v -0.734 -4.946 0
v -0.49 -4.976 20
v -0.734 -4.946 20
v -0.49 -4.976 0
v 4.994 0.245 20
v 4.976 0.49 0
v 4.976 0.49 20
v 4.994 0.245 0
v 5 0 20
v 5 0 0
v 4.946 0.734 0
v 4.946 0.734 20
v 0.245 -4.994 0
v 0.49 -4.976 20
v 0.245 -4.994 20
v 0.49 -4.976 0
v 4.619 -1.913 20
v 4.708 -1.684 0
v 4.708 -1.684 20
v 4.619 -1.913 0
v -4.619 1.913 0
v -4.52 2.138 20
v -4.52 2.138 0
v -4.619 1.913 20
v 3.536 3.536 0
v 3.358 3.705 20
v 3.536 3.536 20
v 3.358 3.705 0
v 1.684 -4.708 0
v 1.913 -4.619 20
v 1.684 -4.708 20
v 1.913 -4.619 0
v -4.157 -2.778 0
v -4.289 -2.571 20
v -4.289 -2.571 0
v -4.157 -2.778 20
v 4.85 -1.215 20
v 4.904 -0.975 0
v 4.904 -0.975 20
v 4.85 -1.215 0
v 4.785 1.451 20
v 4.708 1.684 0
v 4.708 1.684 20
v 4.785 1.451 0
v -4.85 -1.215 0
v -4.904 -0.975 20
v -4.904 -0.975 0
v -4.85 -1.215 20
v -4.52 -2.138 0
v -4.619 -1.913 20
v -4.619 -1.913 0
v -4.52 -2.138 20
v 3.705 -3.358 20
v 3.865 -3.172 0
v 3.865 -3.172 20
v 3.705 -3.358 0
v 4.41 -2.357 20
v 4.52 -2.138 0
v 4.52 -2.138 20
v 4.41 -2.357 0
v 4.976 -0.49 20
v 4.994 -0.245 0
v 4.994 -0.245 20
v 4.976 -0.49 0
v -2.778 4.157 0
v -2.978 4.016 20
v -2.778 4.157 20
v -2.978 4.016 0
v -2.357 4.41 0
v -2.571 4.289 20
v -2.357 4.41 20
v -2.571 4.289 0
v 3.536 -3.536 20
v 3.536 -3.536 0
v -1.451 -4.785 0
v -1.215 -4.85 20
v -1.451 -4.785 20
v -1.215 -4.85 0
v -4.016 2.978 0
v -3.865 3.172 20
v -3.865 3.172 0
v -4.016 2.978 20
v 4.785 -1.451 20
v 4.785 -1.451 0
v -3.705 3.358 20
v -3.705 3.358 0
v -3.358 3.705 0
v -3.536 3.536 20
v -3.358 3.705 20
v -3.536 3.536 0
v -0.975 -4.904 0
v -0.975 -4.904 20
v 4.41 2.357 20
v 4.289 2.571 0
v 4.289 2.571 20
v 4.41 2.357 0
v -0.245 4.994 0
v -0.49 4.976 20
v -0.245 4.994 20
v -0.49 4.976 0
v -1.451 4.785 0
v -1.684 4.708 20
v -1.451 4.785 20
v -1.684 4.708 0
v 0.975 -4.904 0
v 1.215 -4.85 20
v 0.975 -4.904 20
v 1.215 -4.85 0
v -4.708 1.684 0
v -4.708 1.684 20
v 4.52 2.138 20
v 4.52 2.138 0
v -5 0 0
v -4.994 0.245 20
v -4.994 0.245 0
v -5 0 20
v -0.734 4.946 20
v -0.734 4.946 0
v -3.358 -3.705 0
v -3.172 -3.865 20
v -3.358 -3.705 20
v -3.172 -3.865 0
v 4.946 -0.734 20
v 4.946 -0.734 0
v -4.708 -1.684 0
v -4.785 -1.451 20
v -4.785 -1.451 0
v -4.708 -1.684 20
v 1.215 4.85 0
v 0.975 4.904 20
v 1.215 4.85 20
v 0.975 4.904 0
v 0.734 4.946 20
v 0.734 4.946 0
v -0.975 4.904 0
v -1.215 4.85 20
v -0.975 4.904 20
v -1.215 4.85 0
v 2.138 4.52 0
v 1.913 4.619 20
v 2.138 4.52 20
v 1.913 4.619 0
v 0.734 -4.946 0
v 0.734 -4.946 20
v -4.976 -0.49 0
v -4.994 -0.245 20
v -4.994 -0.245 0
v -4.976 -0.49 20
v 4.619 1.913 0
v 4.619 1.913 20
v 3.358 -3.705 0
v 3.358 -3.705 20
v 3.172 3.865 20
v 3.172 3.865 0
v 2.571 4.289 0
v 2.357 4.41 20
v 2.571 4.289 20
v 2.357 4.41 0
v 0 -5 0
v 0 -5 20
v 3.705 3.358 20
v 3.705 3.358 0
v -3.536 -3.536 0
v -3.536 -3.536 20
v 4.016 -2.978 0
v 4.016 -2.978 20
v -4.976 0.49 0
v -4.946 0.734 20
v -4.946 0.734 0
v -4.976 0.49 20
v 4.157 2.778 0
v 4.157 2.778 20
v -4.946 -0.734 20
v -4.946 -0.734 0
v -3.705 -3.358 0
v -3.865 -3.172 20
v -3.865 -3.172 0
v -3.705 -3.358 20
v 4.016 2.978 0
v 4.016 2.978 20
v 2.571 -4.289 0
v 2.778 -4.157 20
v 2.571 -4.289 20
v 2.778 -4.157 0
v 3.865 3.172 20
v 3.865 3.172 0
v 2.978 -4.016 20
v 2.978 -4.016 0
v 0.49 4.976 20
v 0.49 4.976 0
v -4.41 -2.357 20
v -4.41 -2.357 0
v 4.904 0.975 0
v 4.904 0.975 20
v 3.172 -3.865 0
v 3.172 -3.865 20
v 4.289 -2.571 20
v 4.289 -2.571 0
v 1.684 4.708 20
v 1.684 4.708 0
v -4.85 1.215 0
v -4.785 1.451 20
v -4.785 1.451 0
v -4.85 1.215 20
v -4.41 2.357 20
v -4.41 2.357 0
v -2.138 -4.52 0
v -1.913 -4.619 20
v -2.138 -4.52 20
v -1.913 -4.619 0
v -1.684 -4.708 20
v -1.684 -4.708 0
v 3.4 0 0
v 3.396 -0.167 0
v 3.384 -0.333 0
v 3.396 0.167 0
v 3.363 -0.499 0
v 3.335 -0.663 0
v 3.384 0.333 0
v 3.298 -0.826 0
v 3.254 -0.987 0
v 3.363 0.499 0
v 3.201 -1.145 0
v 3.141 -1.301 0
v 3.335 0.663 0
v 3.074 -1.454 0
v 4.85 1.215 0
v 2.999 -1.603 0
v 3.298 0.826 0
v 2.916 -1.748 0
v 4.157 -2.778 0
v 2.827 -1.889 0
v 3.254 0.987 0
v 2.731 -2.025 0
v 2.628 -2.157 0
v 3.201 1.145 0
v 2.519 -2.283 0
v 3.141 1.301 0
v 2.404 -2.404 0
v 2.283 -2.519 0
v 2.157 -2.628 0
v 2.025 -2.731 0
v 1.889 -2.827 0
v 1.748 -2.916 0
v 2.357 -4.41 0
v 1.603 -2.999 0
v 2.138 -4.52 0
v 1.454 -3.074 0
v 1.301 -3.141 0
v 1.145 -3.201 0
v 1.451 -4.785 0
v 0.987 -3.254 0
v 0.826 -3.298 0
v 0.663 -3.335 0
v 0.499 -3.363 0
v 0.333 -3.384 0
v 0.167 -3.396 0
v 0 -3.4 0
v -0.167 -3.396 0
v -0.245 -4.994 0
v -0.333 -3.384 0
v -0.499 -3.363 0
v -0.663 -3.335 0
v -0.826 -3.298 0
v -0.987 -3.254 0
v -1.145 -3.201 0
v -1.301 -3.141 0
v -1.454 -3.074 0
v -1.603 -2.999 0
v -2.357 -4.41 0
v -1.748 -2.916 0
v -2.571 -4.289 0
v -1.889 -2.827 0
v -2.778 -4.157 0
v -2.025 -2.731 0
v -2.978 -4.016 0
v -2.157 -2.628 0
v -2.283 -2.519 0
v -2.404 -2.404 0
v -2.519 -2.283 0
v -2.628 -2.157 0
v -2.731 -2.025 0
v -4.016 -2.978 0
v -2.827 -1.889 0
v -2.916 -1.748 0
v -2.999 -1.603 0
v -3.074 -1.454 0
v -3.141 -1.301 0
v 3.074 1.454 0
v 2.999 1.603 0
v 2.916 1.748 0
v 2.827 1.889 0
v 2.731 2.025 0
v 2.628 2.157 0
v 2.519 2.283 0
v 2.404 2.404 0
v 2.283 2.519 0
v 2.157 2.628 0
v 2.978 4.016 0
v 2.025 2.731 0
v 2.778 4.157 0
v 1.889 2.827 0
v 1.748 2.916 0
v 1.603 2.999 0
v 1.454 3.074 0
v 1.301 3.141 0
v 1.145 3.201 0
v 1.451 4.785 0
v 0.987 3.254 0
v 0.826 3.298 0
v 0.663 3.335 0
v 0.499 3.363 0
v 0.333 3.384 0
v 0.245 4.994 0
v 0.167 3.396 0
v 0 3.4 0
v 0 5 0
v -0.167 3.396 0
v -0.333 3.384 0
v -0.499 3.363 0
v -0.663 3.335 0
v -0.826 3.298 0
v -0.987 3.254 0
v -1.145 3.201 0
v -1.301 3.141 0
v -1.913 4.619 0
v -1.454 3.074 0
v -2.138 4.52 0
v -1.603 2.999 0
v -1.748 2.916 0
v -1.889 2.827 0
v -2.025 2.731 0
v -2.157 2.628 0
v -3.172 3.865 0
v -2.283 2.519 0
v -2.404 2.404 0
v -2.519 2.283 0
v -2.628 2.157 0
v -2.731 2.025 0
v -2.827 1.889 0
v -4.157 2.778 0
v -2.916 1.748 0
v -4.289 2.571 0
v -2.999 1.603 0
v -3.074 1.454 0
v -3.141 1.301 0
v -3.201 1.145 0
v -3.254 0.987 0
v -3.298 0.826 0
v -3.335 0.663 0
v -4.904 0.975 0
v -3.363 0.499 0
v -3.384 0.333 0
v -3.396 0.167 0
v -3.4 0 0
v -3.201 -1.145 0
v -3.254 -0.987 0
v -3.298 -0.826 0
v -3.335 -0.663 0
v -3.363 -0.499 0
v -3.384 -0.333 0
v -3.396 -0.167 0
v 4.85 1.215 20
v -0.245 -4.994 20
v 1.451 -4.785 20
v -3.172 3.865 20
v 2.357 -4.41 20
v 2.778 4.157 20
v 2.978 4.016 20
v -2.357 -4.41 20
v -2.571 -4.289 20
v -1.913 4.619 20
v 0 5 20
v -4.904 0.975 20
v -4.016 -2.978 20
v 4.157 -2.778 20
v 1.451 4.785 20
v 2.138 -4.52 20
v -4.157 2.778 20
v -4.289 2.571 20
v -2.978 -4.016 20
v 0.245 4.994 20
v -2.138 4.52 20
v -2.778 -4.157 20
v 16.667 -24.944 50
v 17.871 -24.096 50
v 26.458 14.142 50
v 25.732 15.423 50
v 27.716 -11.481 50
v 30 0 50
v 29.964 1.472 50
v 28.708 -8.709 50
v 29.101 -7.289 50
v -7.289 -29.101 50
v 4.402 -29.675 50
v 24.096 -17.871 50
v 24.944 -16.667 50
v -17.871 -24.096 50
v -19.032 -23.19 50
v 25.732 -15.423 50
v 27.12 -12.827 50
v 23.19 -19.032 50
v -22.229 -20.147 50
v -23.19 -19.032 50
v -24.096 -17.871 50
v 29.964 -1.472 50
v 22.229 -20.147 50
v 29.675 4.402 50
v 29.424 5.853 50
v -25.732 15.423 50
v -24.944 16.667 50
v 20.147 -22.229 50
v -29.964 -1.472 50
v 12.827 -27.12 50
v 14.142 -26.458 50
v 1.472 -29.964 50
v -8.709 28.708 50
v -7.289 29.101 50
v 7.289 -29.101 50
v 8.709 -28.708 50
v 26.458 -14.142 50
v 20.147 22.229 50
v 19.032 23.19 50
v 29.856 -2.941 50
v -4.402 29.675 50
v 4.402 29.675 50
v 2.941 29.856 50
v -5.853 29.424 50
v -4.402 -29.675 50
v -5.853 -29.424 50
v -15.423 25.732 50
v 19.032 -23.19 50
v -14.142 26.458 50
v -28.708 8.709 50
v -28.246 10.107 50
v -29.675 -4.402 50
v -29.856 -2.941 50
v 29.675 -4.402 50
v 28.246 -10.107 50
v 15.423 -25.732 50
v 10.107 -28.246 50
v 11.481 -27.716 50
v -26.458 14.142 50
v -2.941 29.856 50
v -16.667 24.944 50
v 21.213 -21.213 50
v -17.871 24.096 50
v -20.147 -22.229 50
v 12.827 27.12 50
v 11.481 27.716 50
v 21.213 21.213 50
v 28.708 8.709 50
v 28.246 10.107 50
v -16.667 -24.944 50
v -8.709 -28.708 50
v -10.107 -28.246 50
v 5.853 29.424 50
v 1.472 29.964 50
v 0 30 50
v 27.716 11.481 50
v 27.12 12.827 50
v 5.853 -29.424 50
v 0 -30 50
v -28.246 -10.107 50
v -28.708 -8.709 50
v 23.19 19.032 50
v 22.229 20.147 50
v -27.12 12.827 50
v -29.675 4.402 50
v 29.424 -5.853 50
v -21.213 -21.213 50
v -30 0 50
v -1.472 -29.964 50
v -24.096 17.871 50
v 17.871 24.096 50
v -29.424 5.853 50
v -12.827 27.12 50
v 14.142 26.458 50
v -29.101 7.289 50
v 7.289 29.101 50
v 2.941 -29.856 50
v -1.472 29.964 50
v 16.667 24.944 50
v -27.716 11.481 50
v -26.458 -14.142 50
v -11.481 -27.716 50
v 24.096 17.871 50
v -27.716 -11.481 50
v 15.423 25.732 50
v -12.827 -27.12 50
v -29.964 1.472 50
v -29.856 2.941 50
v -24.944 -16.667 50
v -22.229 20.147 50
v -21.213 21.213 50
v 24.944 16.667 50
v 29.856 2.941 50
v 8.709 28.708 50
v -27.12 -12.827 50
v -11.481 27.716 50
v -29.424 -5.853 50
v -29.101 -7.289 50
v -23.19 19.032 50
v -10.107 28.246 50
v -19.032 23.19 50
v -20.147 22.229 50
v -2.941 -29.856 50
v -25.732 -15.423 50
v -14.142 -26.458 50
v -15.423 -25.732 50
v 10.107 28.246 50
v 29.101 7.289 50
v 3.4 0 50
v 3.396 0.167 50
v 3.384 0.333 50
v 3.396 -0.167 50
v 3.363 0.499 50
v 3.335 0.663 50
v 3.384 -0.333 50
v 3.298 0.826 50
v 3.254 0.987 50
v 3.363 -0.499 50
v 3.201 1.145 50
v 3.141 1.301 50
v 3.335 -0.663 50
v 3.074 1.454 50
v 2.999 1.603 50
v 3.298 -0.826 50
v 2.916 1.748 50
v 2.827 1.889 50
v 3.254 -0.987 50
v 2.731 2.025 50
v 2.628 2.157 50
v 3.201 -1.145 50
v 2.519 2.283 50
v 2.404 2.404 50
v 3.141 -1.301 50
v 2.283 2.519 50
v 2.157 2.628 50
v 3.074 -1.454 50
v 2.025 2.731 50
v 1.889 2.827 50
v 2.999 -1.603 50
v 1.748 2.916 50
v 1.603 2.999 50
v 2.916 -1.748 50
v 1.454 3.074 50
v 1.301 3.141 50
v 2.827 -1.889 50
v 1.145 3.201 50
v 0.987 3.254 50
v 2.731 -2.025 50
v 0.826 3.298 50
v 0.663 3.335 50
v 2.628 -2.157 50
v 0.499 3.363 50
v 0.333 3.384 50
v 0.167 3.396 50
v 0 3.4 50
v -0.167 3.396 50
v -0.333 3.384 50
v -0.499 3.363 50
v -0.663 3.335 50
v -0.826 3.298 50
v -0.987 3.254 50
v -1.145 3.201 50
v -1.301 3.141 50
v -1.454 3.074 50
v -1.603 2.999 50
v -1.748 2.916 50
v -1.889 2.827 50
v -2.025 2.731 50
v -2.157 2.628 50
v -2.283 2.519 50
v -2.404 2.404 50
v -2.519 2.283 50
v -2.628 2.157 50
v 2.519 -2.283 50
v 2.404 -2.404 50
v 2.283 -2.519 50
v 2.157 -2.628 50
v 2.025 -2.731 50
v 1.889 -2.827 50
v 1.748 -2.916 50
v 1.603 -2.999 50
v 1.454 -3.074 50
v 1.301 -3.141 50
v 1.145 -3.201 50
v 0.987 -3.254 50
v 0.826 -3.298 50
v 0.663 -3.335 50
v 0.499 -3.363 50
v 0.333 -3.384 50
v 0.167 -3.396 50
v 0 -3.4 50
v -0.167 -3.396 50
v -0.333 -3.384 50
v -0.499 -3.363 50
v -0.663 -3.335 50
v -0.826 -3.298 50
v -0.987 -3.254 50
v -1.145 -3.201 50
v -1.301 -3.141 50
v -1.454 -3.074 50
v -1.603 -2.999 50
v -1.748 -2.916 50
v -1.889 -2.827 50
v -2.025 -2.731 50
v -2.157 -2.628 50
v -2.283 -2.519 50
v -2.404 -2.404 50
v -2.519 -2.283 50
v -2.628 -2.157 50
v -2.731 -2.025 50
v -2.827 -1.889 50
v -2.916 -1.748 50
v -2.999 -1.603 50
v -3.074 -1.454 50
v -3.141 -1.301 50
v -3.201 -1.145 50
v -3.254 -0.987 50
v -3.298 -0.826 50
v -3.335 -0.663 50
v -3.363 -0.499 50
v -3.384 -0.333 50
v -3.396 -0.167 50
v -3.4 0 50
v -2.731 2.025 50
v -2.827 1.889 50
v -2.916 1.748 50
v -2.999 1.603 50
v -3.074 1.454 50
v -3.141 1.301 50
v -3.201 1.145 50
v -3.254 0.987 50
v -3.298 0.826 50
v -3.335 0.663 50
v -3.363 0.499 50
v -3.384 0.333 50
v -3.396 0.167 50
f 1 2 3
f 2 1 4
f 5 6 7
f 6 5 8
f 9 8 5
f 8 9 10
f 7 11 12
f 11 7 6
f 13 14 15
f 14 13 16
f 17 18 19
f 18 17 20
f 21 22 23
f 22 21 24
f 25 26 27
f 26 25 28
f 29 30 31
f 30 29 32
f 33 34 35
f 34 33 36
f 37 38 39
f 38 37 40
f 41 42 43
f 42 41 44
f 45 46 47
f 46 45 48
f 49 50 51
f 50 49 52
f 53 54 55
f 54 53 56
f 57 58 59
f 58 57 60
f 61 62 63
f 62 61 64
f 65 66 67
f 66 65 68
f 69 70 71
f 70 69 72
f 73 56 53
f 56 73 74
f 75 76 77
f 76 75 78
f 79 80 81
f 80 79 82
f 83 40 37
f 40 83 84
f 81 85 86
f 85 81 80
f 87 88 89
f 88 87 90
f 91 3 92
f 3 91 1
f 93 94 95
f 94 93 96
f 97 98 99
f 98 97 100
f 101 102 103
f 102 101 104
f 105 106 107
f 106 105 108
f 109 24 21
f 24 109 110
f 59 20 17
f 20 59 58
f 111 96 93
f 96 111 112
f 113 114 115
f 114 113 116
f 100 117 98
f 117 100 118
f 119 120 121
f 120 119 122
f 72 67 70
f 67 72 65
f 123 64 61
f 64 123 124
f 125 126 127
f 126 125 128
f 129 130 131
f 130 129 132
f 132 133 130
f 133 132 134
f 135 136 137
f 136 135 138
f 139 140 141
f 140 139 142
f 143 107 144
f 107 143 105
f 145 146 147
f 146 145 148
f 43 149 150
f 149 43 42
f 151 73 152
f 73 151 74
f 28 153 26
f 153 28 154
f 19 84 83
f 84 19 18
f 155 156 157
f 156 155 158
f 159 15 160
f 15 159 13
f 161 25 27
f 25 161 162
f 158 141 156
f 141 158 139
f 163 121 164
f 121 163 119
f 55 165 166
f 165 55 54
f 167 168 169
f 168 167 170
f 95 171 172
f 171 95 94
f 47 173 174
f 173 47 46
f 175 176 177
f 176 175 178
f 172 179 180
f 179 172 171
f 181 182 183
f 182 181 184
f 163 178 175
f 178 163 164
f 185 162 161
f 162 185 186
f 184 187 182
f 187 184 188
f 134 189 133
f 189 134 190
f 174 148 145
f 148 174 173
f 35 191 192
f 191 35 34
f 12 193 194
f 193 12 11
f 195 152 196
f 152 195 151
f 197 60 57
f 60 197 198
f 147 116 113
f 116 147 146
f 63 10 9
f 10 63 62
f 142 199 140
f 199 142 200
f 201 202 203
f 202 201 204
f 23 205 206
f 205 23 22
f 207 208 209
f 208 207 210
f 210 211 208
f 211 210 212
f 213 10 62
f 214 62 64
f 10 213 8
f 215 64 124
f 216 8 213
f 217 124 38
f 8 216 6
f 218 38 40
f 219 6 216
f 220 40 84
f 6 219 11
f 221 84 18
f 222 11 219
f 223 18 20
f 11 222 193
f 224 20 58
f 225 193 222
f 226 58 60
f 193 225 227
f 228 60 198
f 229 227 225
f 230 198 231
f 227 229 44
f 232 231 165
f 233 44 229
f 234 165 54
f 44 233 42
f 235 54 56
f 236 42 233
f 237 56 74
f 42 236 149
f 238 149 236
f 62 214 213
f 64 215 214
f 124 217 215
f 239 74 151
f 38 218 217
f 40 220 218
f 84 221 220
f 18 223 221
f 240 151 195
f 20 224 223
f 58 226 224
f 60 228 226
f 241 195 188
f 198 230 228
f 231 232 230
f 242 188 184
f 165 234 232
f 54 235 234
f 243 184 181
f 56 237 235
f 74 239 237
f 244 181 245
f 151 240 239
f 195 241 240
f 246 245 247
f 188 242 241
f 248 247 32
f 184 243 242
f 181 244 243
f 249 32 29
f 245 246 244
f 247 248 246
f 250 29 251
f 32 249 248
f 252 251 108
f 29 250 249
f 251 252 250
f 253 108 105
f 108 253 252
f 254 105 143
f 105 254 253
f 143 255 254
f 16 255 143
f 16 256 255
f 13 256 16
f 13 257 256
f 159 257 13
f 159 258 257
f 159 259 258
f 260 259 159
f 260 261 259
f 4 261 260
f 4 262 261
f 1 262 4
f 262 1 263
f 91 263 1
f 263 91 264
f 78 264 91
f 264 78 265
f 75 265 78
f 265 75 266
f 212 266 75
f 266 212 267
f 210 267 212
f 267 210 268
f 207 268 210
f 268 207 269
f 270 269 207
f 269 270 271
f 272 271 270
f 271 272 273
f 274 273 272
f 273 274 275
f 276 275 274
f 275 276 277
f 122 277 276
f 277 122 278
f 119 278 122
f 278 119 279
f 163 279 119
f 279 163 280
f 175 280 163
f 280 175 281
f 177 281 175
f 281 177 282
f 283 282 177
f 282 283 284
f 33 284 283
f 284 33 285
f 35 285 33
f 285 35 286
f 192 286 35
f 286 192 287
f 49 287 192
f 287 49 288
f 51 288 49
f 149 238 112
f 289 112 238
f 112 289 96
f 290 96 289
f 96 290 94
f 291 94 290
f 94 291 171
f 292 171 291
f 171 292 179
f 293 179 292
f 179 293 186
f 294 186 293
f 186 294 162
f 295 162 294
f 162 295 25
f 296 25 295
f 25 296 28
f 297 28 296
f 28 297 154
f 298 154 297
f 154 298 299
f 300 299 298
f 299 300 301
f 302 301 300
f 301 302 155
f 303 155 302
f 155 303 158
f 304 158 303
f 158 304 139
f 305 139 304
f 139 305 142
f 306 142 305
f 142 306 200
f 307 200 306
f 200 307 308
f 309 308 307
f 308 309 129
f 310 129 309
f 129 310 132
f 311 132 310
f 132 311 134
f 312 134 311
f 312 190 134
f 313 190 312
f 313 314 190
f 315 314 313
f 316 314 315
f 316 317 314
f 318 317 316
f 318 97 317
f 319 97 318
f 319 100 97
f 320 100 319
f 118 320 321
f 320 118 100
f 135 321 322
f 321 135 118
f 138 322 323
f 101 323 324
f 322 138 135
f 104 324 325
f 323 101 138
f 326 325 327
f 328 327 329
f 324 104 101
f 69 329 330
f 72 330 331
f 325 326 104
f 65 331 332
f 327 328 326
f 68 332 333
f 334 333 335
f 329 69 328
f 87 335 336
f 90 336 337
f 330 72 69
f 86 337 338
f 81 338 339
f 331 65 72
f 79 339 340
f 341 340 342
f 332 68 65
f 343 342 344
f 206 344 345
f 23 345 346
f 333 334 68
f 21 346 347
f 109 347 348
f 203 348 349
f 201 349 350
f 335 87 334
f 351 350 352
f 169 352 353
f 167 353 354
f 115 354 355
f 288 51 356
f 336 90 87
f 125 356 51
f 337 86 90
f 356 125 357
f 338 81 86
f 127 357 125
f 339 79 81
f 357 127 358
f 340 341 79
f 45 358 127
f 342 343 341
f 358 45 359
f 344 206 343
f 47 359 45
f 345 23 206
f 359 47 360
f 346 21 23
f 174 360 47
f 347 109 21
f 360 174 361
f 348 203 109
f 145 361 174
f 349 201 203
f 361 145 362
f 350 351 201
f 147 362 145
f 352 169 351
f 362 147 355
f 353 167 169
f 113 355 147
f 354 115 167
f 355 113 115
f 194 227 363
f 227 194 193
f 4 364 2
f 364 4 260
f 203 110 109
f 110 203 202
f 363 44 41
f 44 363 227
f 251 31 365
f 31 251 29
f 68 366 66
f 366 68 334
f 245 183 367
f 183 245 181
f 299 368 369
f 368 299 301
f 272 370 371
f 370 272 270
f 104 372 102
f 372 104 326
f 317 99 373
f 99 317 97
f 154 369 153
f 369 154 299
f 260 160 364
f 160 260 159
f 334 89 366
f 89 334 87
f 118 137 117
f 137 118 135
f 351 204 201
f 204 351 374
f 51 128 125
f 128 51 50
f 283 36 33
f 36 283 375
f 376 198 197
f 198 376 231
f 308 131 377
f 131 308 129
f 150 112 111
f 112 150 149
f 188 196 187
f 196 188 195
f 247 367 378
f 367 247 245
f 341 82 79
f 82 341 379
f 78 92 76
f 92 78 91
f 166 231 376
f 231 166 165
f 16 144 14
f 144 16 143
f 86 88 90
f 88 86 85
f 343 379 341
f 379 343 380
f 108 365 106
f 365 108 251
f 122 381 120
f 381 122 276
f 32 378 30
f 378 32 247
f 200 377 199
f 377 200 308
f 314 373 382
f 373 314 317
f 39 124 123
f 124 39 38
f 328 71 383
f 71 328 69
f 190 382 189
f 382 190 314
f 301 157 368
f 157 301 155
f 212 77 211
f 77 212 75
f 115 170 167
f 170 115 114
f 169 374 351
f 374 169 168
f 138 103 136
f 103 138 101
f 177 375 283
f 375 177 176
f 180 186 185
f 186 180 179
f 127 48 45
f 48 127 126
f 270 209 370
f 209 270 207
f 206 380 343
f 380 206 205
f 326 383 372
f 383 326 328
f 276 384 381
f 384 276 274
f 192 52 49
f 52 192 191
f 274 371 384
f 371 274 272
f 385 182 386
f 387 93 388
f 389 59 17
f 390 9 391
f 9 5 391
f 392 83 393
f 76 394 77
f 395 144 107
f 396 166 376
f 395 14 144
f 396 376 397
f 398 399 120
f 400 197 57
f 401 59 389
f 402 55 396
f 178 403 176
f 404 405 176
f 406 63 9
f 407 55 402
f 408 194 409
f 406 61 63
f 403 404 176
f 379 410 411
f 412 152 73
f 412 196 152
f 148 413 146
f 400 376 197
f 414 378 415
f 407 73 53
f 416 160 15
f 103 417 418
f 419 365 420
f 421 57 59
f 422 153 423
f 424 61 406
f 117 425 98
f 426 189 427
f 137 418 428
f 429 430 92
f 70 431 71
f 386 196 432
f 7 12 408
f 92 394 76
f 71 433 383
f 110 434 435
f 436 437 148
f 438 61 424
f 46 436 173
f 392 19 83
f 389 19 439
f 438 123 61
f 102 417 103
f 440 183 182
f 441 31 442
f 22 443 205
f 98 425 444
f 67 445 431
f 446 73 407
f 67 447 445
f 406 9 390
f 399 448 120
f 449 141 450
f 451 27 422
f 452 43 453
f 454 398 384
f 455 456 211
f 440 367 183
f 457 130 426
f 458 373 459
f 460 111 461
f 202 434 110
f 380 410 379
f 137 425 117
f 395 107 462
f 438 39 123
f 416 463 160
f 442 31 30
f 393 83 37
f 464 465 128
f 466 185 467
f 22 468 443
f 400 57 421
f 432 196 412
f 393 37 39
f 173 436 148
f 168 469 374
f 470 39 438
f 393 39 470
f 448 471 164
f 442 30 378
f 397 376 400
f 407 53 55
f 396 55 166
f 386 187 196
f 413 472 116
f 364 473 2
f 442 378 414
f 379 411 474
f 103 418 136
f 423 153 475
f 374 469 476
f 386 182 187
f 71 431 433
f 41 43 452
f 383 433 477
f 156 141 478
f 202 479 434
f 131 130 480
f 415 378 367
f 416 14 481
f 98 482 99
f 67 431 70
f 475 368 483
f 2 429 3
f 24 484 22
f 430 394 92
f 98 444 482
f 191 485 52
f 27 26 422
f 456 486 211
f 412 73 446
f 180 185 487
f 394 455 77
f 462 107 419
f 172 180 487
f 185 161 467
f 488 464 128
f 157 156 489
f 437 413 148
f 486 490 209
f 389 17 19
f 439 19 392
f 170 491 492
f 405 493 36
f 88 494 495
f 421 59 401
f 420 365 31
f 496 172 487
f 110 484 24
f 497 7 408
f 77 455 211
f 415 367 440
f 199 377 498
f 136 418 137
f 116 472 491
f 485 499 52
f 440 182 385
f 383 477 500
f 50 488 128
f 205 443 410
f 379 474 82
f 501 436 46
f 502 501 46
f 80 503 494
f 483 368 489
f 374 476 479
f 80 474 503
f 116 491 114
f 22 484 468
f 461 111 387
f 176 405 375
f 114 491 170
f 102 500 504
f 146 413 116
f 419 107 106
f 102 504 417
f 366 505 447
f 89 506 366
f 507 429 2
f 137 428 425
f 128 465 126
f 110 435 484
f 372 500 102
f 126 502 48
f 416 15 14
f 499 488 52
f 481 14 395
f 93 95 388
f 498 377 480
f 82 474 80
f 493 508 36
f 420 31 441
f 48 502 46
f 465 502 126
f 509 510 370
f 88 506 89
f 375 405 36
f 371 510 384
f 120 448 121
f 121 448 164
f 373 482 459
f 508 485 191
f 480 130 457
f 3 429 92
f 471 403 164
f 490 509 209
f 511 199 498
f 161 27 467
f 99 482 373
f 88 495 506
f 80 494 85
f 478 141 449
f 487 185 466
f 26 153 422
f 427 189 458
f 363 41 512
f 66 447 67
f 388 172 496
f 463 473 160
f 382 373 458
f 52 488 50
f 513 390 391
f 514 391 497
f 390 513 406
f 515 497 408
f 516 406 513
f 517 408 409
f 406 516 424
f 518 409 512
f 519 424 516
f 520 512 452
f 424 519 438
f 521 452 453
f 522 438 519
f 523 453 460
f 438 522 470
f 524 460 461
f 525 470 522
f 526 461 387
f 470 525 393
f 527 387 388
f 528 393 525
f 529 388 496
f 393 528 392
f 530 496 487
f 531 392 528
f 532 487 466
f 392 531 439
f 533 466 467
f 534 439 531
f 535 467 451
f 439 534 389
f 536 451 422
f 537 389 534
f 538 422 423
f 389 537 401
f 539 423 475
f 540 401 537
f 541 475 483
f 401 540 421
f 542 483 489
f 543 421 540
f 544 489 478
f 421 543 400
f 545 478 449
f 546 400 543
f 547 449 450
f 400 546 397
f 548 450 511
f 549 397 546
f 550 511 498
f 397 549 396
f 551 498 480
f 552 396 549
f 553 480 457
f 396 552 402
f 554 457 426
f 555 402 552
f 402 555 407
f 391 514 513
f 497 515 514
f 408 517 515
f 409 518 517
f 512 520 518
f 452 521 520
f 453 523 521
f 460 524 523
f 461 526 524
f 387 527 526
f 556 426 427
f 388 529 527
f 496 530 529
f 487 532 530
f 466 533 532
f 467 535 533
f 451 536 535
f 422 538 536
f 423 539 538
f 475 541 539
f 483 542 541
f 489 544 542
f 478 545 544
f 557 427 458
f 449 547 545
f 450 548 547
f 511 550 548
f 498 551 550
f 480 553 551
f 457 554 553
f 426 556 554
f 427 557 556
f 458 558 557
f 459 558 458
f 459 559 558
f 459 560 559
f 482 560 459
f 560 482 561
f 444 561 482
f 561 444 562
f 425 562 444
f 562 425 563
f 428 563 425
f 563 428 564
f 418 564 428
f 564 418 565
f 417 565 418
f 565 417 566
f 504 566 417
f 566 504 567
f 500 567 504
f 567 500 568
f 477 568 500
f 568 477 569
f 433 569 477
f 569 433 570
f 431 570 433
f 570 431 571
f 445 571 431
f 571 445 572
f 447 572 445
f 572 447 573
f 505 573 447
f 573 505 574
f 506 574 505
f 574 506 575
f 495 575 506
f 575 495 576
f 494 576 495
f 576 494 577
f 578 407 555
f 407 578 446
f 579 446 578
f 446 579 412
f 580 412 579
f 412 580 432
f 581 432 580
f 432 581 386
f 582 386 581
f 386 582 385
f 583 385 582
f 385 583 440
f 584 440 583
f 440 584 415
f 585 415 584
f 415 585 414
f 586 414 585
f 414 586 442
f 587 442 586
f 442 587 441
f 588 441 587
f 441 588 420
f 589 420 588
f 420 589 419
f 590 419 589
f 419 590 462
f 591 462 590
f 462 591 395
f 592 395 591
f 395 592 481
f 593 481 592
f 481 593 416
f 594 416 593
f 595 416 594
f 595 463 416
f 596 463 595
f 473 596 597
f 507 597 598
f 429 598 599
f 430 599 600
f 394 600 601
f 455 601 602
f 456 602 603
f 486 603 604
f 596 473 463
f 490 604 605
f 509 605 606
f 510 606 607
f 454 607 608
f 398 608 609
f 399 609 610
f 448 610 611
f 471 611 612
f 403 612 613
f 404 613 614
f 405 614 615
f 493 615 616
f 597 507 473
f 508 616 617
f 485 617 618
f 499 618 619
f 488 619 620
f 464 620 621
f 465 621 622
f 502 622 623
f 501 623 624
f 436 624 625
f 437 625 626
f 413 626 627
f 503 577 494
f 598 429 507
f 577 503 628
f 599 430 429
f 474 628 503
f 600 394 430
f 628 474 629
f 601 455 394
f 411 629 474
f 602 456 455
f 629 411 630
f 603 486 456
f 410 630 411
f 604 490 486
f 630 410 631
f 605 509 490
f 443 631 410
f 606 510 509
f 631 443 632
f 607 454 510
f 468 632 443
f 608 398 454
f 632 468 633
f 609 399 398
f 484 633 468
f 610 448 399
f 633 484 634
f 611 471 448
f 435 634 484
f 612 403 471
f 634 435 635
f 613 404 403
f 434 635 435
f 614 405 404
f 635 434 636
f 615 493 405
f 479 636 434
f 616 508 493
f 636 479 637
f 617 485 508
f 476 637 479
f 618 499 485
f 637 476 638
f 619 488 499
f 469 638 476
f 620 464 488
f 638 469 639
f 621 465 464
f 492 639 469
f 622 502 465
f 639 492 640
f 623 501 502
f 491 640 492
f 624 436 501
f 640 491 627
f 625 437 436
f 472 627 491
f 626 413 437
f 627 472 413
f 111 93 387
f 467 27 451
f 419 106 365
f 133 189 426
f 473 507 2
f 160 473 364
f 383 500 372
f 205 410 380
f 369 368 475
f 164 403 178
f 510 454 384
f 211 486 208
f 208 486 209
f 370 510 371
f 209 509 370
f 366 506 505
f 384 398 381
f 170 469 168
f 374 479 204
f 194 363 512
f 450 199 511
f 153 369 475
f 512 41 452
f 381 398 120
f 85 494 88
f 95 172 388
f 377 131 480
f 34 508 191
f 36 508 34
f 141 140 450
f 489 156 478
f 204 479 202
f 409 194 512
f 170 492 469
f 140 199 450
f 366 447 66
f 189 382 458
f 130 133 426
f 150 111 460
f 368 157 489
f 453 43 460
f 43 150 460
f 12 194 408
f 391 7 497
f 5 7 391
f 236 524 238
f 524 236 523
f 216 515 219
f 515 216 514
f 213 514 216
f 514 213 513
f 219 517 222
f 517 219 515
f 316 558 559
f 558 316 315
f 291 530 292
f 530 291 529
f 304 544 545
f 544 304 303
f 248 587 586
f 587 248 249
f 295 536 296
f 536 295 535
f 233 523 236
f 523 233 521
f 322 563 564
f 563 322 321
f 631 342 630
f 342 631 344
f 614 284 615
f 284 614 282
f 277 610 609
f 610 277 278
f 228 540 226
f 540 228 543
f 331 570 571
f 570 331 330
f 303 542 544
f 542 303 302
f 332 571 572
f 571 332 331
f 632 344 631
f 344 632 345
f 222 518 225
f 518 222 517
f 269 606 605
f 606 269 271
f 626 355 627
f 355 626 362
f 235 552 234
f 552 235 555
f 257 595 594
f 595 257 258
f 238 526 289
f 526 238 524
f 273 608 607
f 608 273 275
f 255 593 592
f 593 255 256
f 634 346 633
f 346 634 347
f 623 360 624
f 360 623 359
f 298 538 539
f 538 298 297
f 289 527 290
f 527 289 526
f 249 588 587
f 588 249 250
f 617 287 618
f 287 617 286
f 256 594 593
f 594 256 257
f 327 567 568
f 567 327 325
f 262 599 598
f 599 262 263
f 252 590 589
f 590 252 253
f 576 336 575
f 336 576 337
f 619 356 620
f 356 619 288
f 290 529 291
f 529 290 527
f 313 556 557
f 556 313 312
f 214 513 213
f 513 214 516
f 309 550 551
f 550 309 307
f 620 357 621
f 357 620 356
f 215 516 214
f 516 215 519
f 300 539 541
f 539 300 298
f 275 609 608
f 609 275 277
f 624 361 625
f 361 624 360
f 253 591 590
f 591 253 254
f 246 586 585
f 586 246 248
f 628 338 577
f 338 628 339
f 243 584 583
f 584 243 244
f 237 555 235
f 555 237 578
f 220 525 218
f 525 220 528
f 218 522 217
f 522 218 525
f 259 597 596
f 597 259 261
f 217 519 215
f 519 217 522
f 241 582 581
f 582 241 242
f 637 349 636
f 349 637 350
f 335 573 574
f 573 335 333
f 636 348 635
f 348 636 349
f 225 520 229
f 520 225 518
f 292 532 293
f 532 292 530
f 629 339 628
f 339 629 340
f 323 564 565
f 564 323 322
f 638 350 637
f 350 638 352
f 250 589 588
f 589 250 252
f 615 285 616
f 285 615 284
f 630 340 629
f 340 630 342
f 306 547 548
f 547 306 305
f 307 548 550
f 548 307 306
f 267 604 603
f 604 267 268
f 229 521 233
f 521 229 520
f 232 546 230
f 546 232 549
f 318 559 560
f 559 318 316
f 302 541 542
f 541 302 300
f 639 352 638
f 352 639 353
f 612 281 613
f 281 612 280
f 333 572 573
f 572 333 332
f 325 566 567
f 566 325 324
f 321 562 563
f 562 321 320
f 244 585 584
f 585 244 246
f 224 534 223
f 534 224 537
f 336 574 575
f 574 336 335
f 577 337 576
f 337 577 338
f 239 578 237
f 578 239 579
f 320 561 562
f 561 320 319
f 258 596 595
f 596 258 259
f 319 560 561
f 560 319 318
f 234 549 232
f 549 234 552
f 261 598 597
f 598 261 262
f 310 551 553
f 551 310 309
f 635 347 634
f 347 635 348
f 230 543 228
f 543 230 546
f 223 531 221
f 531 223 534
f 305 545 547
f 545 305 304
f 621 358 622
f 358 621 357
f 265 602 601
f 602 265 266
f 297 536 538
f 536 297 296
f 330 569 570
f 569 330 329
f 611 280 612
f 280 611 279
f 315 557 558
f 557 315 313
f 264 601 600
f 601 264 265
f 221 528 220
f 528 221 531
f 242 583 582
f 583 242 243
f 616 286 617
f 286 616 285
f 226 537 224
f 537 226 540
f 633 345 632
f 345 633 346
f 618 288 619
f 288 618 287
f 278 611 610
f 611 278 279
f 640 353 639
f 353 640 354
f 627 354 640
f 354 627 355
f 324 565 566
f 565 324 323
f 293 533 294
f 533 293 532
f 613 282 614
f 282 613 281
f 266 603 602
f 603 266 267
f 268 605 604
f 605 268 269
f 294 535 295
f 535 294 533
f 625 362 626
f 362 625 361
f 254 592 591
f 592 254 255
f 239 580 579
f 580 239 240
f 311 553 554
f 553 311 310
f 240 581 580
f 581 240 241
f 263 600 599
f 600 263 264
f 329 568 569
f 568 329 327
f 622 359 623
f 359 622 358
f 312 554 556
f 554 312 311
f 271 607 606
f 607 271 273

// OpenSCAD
// Small lab funnel, printed upright: spout at bottom (z = 0), wide opening at top.
// All dimensions in mm.

// ---- Parameters ----
spout_od      = 10;    // spout outer diameter
spout_h       = 20;    // spout height (z = 0 to 20)
cone_od_top   = 60;    // cone outer diameter at rim
cone_h        = 30;    // cone height (z = 20 to 50)
wall          = 1.6;   // wall thickness everywhere
eps           = 0.5;   // overshoot for clean boolean cuts

$fn = 128;

// ---- Derived ----
bore = spout_od - 2 * wall;   // spout bore = 6.8 mm
rim_d = cone_od_top;          // rim outer diameter at z = 50

// ---- Model ----
difference() {
    union() {
        // Spout: cylinder from z = 0 to z = 20
        translate([0, 0, 0])
            cylinder(d = spout_od, h = spout_h);

        // Cone: from z = 20 to z = 50, 10 mm -> 60 mm outer diameter
        translate([0, 0, spout_h])
            cylinder(d1 = spout_od, d2 = rim_d, h = cone_h);
    }

    // Bore through the spout (and cone, so the passage is straight)
    translate([0, 0, -eps])
        cylinder(d = bore, h = spout_h + cone_h + 2 * eps);
}
